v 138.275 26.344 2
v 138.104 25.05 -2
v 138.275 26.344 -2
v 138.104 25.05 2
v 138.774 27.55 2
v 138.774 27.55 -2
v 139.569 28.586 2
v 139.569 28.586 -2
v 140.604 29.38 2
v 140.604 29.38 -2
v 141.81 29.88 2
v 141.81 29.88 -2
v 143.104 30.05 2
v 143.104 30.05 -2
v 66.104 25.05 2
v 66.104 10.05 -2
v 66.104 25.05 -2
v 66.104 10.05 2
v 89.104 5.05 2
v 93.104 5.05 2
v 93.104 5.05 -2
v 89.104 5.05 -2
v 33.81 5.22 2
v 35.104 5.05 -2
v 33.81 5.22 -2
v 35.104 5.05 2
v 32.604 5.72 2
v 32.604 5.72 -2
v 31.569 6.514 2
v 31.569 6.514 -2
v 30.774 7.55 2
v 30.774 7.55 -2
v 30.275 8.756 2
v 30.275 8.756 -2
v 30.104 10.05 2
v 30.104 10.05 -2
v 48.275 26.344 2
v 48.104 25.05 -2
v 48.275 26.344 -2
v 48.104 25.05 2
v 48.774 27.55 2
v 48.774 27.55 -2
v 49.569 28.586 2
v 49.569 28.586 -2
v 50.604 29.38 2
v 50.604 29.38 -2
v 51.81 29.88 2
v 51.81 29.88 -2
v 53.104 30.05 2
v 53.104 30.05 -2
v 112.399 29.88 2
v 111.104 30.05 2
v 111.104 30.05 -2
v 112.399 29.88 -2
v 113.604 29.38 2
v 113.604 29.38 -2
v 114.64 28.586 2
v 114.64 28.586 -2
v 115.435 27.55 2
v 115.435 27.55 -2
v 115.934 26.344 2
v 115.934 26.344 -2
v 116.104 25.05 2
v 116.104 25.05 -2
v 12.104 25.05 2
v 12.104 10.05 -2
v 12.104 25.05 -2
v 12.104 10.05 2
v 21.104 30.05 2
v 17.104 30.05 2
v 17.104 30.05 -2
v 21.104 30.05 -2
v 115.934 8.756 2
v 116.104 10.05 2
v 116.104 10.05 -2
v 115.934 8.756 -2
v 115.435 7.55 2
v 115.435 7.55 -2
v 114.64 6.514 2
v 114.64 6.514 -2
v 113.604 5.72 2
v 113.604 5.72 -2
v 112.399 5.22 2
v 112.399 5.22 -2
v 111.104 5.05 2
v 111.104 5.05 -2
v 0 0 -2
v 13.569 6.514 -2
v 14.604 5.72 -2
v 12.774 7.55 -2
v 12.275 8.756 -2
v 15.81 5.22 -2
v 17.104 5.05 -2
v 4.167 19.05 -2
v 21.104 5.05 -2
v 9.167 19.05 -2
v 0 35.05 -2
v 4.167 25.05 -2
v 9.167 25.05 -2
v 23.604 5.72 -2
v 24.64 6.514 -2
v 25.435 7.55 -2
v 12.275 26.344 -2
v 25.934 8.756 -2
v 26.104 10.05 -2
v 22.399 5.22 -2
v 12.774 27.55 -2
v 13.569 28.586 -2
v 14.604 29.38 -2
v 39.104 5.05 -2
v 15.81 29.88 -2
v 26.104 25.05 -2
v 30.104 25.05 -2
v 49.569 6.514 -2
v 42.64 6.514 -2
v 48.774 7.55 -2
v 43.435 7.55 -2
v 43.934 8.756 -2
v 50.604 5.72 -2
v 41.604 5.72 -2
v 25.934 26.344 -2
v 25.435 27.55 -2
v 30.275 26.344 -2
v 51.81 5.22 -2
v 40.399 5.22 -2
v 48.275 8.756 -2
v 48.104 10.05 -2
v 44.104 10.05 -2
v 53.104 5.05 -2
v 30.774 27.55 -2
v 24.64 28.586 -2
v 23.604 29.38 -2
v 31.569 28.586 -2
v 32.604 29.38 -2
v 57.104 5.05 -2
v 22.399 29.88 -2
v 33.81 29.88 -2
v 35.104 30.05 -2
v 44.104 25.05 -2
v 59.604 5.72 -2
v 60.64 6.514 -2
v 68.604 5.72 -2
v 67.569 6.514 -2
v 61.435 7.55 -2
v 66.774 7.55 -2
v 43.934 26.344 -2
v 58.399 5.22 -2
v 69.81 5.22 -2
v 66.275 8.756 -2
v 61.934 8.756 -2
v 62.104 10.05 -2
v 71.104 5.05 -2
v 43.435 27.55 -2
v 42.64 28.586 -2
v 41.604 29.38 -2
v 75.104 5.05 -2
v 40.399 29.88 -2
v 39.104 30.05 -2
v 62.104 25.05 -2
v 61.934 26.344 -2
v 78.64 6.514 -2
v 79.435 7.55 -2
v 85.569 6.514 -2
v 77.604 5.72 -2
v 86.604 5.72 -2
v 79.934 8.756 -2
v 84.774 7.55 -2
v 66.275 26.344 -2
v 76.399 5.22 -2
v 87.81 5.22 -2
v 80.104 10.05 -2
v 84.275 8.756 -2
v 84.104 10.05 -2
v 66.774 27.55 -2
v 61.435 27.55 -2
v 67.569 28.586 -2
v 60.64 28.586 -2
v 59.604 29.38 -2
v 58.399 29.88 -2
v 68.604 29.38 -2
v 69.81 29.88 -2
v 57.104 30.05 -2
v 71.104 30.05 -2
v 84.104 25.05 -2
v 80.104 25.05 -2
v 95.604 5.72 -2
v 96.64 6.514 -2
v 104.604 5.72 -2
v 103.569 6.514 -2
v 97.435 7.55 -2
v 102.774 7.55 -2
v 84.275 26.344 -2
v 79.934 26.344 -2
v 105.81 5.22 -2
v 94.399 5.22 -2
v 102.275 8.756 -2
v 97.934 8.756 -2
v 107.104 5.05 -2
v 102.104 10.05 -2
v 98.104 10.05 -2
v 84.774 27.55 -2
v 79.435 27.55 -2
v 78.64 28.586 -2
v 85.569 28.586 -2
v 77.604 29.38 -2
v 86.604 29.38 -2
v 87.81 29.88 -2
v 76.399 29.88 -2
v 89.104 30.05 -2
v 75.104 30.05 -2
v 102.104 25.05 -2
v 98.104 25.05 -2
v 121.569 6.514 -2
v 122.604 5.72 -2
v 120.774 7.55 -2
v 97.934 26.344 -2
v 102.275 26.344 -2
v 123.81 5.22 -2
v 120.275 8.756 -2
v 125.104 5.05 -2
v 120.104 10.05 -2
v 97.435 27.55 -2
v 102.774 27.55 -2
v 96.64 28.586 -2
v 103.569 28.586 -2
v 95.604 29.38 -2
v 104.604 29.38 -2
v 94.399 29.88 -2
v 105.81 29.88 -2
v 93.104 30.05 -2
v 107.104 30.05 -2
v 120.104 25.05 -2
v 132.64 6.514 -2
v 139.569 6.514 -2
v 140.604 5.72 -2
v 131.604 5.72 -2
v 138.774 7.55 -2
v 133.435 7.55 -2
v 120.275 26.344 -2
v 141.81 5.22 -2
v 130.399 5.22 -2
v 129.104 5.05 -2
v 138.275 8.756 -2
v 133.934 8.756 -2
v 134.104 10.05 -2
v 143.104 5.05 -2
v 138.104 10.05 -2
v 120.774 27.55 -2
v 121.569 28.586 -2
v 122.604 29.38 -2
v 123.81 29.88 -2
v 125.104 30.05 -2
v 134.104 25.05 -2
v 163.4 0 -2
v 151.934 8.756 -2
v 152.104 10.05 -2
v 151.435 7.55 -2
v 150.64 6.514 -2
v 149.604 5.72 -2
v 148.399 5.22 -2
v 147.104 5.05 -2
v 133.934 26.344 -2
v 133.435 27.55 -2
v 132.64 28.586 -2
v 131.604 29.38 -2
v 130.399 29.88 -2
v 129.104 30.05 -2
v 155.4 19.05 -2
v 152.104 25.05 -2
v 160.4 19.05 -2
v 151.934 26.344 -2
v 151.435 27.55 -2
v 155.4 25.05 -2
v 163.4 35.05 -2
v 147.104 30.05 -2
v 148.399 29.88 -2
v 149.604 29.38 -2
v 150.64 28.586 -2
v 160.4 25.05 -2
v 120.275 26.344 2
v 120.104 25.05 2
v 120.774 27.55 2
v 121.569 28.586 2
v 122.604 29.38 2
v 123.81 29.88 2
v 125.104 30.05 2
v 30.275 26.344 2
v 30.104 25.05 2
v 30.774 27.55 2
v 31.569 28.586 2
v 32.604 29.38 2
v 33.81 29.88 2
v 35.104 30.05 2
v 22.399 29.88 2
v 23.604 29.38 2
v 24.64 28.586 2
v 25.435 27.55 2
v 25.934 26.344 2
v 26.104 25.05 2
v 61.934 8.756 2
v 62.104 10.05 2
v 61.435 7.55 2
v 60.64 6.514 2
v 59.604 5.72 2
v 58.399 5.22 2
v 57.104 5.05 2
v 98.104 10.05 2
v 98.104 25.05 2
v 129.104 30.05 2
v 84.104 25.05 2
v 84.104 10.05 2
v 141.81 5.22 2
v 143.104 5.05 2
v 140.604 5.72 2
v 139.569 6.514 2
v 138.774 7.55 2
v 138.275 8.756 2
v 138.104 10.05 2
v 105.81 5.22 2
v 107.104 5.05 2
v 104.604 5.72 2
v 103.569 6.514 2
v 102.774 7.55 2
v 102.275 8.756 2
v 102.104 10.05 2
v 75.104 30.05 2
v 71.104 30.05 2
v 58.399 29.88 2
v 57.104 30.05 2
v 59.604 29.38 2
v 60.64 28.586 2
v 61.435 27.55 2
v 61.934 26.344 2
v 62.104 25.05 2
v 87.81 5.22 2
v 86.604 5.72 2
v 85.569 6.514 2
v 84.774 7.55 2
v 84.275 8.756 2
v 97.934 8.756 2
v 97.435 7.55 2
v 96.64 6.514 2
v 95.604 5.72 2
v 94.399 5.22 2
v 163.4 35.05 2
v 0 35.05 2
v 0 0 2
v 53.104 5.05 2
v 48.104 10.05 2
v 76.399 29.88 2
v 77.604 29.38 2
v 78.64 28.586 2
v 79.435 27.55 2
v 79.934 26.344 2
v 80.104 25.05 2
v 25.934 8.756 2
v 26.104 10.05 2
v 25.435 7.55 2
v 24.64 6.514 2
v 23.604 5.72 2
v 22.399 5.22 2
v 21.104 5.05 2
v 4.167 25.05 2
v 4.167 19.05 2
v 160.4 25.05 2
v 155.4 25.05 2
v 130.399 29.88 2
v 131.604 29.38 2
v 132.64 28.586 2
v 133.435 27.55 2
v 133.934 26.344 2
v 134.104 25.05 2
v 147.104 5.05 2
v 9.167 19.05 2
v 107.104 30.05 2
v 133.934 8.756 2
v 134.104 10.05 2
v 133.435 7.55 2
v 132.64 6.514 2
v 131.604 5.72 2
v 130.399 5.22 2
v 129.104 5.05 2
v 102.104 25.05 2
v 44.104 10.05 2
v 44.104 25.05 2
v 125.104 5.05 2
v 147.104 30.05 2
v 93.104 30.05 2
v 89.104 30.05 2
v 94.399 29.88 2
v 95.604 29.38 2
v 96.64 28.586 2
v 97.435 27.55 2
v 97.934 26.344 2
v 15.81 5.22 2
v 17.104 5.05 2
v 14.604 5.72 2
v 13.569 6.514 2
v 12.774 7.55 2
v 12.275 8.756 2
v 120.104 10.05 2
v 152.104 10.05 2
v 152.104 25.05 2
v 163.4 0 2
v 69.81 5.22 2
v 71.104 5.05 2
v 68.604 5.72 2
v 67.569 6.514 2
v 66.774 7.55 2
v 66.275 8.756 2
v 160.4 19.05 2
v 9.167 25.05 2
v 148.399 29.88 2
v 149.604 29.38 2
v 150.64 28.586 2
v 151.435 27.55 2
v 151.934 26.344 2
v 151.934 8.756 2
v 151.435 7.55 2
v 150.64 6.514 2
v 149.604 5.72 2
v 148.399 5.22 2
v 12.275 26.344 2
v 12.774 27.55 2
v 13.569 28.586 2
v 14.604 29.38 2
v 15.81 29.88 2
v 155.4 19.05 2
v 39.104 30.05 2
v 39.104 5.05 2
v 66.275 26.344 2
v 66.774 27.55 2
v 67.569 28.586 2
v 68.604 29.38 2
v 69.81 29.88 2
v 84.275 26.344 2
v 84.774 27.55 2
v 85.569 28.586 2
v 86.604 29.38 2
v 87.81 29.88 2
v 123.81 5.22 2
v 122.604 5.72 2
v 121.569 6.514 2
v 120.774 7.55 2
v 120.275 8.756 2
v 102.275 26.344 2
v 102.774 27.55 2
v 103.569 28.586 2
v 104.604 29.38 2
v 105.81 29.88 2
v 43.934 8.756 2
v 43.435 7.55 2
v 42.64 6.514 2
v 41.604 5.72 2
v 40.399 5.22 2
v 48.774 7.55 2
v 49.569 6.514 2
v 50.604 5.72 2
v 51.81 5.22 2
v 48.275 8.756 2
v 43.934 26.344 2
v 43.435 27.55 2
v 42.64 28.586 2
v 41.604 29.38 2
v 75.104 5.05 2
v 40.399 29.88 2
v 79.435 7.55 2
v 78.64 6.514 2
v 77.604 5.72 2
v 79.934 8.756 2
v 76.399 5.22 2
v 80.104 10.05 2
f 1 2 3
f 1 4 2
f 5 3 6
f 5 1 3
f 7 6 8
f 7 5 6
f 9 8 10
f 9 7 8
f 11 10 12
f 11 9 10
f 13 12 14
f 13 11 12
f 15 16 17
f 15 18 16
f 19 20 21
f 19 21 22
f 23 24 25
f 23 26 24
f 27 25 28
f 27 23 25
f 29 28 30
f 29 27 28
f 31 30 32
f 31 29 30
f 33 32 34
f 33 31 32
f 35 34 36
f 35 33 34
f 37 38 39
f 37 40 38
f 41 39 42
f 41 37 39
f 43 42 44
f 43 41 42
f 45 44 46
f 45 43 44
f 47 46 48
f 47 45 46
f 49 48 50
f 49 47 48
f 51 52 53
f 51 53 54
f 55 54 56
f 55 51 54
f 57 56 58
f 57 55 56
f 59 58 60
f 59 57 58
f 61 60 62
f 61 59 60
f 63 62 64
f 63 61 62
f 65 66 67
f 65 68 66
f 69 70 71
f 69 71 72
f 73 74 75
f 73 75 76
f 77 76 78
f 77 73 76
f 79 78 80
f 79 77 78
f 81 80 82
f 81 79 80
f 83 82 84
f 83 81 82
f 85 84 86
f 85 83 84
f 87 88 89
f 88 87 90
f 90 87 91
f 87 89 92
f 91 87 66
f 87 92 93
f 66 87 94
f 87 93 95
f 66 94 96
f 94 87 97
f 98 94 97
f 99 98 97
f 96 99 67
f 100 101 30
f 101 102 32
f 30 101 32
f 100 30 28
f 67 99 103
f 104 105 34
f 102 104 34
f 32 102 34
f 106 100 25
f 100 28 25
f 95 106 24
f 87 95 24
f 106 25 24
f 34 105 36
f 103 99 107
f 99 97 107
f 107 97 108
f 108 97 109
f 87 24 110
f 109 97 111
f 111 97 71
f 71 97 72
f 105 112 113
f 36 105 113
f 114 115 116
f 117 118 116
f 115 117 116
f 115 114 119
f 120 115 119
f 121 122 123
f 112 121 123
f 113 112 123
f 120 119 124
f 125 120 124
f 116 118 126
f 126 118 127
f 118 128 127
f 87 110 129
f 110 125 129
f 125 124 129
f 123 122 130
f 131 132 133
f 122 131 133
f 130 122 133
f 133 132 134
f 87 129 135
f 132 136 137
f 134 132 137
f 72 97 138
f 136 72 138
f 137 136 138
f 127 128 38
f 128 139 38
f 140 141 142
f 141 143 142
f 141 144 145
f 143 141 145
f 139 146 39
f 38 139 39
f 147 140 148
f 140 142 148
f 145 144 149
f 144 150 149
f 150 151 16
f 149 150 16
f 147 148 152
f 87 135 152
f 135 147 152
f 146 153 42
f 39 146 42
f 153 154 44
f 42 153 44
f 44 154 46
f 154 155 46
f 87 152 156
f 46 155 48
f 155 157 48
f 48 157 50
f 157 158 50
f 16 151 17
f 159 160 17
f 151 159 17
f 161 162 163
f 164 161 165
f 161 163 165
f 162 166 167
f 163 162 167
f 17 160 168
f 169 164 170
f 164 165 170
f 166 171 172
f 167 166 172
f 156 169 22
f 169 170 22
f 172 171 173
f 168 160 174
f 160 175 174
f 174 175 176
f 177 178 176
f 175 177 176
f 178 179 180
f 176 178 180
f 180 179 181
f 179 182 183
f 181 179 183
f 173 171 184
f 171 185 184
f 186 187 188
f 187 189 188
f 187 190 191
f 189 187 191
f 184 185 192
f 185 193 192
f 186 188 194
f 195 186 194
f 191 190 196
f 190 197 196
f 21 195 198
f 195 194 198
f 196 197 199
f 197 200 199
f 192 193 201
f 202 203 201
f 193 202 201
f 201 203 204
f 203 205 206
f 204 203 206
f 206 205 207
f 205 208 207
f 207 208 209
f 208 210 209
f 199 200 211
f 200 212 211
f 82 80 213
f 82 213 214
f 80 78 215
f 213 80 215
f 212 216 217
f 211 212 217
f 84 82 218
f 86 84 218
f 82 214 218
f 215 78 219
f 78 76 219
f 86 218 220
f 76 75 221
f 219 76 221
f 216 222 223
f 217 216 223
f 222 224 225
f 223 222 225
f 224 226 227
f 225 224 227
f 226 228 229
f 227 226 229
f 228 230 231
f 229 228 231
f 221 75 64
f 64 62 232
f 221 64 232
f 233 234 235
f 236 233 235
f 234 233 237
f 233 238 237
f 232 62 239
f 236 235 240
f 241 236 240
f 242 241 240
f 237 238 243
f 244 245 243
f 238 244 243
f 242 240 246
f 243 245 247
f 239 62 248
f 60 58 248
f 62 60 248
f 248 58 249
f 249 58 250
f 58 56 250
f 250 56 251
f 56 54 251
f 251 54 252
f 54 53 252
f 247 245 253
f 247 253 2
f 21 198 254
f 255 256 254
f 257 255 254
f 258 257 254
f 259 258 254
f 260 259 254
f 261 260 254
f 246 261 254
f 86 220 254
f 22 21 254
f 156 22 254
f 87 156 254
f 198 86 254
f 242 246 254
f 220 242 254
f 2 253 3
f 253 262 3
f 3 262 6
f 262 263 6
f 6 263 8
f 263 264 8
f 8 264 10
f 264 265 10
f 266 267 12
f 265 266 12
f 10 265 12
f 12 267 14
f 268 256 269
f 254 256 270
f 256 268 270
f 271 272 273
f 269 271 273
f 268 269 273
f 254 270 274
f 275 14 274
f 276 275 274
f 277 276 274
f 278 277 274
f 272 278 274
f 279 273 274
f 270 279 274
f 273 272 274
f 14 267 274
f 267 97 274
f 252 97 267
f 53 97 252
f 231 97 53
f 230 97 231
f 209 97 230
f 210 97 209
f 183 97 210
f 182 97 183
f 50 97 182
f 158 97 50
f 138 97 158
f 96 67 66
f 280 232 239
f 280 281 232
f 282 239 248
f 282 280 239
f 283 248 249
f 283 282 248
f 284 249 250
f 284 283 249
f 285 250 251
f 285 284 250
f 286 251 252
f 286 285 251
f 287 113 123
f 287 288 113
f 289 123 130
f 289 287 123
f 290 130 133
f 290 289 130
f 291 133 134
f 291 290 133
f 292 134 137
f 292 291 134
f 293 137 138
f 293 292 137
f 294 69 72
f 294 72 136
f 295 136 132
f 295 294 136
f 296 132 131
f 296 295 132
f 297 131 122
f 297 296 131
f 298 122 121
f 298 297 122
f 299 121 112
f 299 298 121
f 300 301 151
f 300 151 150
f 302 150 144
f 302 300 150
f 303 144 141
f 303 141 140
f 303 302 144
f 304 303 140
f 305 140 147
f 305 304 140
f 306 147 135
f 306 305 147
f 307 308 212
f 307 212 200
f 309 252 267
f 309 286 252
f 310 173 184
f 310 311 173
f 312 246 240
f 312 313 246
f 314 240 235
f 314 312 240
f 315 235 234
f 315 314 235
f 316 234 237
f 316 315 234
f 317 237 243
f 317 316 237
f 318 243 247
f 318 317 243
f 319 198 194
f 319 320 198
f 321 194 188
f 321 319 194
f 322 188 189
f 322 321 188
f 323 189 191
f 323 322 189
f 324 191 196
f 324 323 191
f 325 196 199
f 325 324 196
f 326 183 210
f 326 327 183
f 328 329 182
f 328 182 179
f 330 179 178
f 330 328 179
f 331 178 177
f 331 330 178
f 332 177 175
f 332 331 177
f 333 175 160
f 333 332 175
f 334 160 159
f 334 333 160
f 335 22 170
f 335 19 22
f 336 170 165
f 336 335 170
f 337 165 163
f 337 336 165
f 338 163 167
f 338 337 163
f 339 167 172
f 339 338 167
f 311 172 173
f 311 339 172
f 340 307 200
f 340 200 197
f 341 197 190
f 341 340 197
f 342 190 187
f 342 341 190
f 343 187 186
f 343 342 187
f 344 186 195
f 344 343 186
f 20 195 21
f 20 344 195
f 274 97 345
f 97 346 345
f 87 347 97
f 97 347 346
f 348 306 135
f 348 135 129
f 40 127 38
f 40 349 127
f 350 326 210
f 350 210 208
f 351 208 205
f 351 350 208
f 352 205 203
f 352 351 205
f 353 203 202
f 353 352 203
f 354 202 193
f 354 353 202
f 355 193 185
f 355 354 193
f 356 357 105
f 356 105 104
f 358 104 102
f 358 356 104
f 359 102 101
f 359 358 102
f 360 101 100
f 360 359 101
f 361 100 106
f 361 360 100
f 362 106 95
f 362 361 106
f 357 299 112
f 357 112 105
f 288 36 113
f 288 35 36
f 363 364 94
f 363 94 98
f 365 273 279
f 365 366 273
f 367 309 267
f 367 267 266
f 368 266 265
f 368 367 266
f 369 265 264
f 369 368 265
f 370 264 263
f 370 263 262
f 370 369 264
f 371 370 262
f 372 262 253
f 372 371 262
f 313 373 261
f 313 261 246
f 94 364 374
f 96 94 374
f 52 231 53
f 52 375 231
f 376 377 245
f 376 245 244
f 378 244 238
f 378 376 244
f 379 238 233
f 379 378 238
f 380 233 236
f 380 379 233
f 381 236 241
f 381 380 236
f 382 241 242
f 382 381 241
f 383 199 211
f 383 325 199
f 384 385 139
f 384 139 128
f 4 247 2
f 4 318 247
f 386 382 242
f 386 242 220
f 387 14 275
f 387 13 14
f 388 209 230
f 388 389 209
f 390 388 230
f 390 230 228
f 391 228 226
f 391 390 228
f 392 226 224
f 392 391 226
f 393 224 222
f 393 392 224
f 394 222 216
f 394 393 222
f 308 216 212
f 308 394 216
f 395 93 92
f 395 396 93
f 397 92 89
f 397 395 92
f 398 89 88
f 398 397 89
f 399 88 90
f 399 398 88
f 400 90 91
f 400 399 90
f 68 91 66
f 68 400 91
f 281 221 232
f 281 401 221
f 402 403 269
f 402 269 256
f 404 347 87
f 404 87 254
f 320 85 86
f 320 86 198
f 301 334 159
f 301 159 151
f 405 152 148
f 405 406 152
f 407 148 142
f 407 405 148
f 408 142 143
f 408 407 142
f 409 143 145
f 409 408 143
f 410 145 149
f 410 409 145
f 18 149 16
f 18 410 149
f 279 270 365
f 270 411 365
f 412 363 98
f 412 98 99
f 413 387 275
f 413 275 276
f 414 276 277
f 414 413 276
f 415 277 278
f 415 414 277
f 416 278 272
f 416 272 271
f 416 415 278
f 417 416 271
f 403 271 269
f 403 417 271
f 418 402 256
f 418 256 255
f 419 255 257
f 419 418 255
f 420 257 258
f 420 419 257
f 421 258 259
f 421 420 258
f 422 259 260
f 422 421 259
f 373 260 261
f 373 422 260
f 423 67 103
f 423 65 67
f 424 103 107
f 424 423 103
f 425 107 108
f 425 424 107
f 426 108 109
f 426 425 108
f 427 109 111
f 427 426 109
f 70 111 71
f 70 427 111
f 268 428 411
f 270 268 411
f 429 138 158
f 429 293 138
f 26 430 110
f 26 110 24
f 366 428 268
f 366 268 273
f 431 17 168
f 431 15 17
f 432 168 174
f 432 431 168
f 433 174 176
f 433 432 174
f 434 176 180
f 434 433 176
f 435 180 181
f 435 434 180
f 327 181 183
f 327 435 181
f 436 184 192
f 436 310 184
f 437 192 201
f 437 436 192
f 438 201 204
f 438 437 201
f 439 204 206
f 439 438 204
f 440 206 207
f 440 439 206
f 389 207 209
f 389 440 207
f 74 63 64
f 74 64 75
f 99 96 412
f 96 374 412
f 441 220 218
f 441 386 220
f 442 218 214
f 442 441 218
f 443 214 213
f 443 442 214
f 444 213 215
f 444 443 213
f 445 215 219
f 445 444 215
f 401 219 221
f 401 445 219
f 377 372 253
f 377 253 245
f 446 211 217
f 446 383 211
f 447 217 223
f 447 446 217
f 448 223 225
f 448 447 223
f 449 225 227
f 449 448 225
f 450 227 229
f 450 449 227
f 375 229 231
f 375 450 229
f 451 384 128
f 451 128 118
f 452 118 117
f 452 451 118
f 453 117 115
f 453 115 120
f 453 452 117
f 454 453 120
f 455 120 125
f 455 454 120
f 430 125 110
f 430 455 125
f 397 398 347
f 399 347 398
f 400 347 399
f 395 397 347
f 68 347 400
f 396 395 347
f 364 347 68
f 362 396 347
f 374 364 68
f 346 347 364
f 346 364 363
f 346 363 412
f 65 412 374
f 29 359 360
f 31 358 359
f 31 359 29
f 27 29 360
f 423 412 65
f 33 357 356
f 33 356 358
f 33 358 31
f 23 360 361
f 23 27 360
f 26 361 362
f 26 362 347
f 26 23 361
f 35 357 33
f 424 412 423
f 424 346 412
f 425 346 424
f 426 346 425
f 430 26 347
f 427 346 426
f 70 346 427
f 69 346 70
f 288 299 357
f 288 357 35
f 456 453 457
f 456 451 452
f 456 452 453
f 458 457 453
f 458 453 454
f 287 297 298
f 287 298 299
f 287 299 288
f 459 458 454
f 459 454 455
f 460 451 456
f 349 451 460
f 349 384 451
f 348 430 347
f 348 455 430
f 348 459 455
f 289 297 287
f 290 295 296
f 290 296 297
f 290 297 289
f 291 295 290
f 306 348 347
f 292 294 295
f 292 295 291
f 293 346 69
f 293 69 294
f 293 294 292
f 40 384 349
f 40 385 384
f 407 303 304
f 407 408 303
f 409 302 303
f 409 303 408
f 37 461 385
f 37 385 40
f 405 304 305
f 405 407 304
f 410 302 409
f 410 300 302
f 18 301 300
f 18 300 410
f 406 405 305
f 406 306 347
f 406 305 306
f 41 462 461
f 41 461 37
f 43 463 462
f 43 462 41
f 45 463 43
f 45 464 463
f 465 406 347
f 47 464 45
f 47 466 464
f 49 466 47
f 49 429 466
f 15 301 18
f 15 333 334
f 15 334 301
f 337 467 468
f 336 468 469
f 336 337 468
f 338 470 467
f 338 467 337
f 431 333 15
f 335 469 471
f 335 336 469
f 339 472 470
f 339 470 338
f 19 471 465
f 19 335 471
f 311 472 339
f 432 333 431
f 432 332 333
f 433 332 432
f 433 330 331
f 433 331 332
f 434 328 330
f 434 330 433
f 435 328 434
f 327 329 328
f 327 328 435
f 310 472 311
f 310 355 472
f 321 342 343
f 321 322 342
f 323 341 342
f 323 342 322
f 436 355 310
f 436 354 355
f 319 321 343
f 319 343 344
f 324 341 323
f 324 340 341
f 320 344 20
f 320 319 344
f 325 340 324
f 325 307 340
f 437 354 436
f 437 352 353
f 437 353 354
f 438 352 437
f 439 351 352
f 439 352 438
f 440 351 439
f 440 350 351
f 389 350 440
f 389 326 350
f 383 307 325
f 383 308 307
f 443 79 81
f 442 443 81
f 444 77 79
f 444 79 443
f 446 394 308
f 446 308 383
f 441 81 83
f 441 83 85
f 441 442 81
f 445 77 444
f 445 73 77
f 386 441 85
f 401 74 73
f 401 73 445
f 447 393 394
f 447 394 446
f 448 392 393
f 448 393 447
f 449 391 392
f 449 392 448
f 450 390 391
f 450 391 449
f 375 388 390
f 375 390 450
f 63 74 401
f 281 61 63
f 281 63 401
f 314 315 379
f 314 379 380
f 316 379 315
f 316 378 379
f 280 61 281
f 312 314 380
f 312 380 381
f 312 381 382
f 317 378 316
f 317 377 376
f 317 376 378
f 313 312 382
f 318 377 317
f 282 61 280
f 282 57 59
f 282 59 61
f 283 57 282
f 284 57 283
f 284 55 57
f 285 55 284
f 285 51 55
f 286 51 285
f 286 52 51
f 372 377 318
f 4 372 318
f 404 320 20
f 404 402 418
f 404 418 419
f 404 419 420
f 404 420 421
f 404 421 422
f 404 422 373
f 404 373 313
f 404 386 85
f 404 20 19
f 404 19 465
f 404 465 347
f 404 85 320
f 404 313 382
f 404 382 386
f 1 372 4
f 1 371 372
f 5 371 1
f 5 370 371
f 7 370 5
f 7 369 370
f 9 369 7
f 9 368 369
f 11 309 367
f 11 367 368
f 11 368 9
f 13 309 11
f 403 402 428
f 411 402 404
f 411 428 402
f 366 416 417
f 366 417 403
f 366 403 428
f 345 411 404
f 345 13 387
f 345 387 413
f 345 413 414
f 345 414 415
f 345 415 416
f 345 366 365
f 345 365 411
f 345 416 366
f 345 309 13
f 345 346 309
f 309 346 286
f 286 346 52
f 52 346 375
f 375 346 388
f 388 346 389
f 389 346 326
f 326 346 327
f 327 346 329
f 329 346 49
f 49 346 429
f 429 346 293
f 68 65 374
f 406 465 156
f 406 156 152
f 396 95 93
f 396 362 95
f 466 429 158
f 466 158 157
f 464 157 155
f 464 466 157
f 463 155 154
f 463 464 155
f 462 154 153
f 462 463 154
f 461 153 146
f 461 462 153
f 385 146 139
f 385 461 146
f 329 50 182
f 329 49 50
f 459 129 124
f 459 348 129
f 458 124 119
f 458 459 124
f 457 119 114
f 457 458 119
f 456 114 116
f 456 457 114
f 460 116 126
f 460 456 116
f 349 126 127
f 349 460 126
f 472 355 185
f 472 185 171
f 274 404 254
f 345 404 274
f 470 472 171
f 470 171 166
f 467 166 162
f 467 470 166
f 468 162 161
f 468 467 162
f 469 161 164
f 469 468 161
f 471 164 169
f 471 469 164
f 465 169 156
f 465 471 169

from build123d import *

# Parameters (mm, degrees)
F0_W     = 163.4
F0_H     = 35.05
F0_W_2   = 5
F0_H_2   = 6
F1_DEPTH = 2


with BuildPart() as f1:
    # F0 (on Top) → F1 (new body, symmetric)
    with BuildSketch(Plane.XY):
        with Locations((81.7, 17.525)):
            Rectangle(F0_W, F0_H)
        with BuildLine():
            Line((17.10444, 30.05), (21.10444, 30.05))
            ThreePointArc((21.10444, 30.05), (24.639974, 28.585534), (26.10444, 25.05))
            Line((26.10444, 25.05), (26.10444, 10.05))
            ThreePointArc((26.10444, 10.05), (24.639974, 6.514466), (21.10444, 5.05))
            Line((21.10444, 5.05), (17.10444, 5.05))
            ThreePointArc((17.10444, 5.05), (13.568906, 6.514466), (12.10444, 10.05))
            Line((12.10444, 10.05), (12.10444, 25.05))
            ThreePointArc((12.10444, 25.05), (13.568906, 28.585534), (17.10444, 30.05))
        make_face(mode=Mode.SUBTRACT)
        with BuildLine():
            ThreePointArc((39.10444, 30.05), (42.639974, 28.585534), (44.10444, 25.05))
            Line((44.10444, 25.05), (44.10444, 10.05))
            ThreePointArc((44.10444, 10.05), (42.639974, 6.514466), (39.10444, 5.05))
            Line((39.10444, 5.05), (35.10444, 5.05))
            ThreePointArc((35.10444, 5.05), (31.568906, 6.514466), (30.10444, 10.05))
            Line((30.10444, 10.05), (30.10444, 25.05))
            ThreePointArc((30.10444, 25.05), (31.568906, 28.585534), (35.10444, 30.05))
            Line((35.10444, 30.05), (39.10444, 30.05))
        make_face(mode=Mode.SUBTRACT)
        with Locations((6.666683, 22.05)):
            Rectangle(F0_W_2, F0_H_2, mode=Mode.SUBTRACT)
        with BuildLine():
            ThreePointArc((57.10444, 30.05), (60.639974, 28.585534), (62.10444, 25.05))
            Line((62.10444, 25.05), (62.10444, 10.05))
            ThreePointArc((62.10444, 10.05), (60.639974, 6.514466), (57.10444, 5.05))
            Line((57.10444, 5.05), (53.10444, 5.05))
            ThreePointArc((53.10444, 5.05), (49.568906, 6.514466), (48.10444, 10.05))
            Line((48.10444, 10.05), (48.10444, 25.05))
            ThreePointArc((48.10444, 25.05), (49.568906, 28.585534), (53.10444, 30.05))
            Line((53.10444, 30.05), (57.10444, 30.05))
        make_face(mode=Mode.SUBTRACT)
        with BuildLine():
            ThreePointArc((75.10444, 30.05), (78.639974, 28.585534), (80.10444, 25.05))
            Line((80.10444, 25.05), (80.10444, 10.05))
            ThreePointArc((80.10444, 10.05), (78.639974, 6.514466), (75.10444, 5.05))
            Line((75.10444, 5.05), (71.10444, 5.05))
            ThreePointArc((71.10444, 5.05), (67.568906, 6.514466), (66.10444, 10.05))
            Line((66.10444, 10.05), (66.10444, 25.05))
            ThreePointArc((66.10444, 25.05), (67.568906, 28.585534), (71.10444, 30.05))
            Line((71.10444, 30.05), (75.10444, 30.05))
        make_face(mode=Mode.SUBTRACT)
        with BuildLine():
            ThreePointArc((93.10444, 30.05), (96.639974, 28.585534), (98.10444, 25.05))
            Line((98.10444, 25.05), (98.10444, 10.05))
            ThreePointArc((98.10444, 10.05), (96.639974, 6.514466), (93.10444, 5.05))
            Line((93.10444, 5.05), (89.10444, 5.05))
            ThreePointArc((89.10444, 5.05), (85.568906, 6.514466), (84.10444, 10.05))
            Line((84.10444, 10.05), (84.10444, 25.05))
            ThreePointArc((84.10444, 25.05), (85.568906, 28.585534), (89.10444, 30.05))
            Line((89.10444, 30.05), (93.10444, 30.05))
        make_face(mode=Mode.SUBTRACT)
        with BuildLine():
            ThreePointArc((111.10444, 30.05), (114.639974, 28.585534), (116.10444, 25.05))
            Line((116.10444, 25.05), (116.10444, 10.05))
            ThreePointArc((116.10444, 10.05), (114.639974, 6.514466), (111.10444, 5.05))
            Line((111.10444, 5.05), (107.10444, 5.05))
            ThreePointArc((107.10444, 5.05), (103.568906, 6.514466), (102.10444, 10.05))
            Line((102.10444, 10.05), (102.10444, 25.05))
            ThreePointArc((102.10444, 25.05), (103.568906, 28.585534), (107.10444, 30.05))
            Line((107.10444, 30.05), (111.10444, 30.05))
        make_face(mode=Mode.SUBTRACT)
        with BuildLine():
            ThreePointArc((129.10444, 30.05), (132.639974, 28.585534), (134.10444, 25.05))
            Line((134.10444, 25.05), (134.10444, 10.05))
            ThreePointArc((134.10444, 10.05), (132.639974, 6.514466), (129.10444, 5.05))
            Line((129.10444, 5.05), (125.10444, 5.05))
            ThreePointArc((125.10444, 5.05), (121.568906, 6.514466), (120.10444, 10.05))
            Line((120.10444, 10.05), (120.10444, 25.05))
            ThreePointArc((120.10444, 25.05), (121.568906, 28.585534), (125.10444, 30.05))
            Line((125.10444, 30.05), (129.10444, 30.05))
        make_face(mode=Mode.SUBTRACT)
        with BuildLine():
            ThreePointArc((147.10444, 30.05), (150.639974, 28.585534), (152.10444, 25.05))
            Line((152.10444, 25.05), (152.10444, 10.05))
            ThreePointArc((152.10444, 10.05), (150.639974, 6.514466), (147.10444, 5.05))
            Line((147.10444, 5.05), (143.10444, 5.05))
            ThreePointArc((143.10444, 5.05), (139.568906, 6.514466), (138.10444, 10.05))
            Line((138.10444, 10.05), (138.10444, 25.05))
            ThreePointArc((138.10444, 25.05), (139.568906, 28.585534), (143.10444, 30.05))
            Line((143.10444, 30.05), (147.10444, 30.05))
        make_face(mode=Mode.SUBTRACT)
        with Locations((157.9, 22.05)):
            Rectangle(F0_W_2, F0_H_2, mode=Mode.SUBTRACT)
    extrude(amount=F1_DEPTH, both=True)


solid = f1.part
